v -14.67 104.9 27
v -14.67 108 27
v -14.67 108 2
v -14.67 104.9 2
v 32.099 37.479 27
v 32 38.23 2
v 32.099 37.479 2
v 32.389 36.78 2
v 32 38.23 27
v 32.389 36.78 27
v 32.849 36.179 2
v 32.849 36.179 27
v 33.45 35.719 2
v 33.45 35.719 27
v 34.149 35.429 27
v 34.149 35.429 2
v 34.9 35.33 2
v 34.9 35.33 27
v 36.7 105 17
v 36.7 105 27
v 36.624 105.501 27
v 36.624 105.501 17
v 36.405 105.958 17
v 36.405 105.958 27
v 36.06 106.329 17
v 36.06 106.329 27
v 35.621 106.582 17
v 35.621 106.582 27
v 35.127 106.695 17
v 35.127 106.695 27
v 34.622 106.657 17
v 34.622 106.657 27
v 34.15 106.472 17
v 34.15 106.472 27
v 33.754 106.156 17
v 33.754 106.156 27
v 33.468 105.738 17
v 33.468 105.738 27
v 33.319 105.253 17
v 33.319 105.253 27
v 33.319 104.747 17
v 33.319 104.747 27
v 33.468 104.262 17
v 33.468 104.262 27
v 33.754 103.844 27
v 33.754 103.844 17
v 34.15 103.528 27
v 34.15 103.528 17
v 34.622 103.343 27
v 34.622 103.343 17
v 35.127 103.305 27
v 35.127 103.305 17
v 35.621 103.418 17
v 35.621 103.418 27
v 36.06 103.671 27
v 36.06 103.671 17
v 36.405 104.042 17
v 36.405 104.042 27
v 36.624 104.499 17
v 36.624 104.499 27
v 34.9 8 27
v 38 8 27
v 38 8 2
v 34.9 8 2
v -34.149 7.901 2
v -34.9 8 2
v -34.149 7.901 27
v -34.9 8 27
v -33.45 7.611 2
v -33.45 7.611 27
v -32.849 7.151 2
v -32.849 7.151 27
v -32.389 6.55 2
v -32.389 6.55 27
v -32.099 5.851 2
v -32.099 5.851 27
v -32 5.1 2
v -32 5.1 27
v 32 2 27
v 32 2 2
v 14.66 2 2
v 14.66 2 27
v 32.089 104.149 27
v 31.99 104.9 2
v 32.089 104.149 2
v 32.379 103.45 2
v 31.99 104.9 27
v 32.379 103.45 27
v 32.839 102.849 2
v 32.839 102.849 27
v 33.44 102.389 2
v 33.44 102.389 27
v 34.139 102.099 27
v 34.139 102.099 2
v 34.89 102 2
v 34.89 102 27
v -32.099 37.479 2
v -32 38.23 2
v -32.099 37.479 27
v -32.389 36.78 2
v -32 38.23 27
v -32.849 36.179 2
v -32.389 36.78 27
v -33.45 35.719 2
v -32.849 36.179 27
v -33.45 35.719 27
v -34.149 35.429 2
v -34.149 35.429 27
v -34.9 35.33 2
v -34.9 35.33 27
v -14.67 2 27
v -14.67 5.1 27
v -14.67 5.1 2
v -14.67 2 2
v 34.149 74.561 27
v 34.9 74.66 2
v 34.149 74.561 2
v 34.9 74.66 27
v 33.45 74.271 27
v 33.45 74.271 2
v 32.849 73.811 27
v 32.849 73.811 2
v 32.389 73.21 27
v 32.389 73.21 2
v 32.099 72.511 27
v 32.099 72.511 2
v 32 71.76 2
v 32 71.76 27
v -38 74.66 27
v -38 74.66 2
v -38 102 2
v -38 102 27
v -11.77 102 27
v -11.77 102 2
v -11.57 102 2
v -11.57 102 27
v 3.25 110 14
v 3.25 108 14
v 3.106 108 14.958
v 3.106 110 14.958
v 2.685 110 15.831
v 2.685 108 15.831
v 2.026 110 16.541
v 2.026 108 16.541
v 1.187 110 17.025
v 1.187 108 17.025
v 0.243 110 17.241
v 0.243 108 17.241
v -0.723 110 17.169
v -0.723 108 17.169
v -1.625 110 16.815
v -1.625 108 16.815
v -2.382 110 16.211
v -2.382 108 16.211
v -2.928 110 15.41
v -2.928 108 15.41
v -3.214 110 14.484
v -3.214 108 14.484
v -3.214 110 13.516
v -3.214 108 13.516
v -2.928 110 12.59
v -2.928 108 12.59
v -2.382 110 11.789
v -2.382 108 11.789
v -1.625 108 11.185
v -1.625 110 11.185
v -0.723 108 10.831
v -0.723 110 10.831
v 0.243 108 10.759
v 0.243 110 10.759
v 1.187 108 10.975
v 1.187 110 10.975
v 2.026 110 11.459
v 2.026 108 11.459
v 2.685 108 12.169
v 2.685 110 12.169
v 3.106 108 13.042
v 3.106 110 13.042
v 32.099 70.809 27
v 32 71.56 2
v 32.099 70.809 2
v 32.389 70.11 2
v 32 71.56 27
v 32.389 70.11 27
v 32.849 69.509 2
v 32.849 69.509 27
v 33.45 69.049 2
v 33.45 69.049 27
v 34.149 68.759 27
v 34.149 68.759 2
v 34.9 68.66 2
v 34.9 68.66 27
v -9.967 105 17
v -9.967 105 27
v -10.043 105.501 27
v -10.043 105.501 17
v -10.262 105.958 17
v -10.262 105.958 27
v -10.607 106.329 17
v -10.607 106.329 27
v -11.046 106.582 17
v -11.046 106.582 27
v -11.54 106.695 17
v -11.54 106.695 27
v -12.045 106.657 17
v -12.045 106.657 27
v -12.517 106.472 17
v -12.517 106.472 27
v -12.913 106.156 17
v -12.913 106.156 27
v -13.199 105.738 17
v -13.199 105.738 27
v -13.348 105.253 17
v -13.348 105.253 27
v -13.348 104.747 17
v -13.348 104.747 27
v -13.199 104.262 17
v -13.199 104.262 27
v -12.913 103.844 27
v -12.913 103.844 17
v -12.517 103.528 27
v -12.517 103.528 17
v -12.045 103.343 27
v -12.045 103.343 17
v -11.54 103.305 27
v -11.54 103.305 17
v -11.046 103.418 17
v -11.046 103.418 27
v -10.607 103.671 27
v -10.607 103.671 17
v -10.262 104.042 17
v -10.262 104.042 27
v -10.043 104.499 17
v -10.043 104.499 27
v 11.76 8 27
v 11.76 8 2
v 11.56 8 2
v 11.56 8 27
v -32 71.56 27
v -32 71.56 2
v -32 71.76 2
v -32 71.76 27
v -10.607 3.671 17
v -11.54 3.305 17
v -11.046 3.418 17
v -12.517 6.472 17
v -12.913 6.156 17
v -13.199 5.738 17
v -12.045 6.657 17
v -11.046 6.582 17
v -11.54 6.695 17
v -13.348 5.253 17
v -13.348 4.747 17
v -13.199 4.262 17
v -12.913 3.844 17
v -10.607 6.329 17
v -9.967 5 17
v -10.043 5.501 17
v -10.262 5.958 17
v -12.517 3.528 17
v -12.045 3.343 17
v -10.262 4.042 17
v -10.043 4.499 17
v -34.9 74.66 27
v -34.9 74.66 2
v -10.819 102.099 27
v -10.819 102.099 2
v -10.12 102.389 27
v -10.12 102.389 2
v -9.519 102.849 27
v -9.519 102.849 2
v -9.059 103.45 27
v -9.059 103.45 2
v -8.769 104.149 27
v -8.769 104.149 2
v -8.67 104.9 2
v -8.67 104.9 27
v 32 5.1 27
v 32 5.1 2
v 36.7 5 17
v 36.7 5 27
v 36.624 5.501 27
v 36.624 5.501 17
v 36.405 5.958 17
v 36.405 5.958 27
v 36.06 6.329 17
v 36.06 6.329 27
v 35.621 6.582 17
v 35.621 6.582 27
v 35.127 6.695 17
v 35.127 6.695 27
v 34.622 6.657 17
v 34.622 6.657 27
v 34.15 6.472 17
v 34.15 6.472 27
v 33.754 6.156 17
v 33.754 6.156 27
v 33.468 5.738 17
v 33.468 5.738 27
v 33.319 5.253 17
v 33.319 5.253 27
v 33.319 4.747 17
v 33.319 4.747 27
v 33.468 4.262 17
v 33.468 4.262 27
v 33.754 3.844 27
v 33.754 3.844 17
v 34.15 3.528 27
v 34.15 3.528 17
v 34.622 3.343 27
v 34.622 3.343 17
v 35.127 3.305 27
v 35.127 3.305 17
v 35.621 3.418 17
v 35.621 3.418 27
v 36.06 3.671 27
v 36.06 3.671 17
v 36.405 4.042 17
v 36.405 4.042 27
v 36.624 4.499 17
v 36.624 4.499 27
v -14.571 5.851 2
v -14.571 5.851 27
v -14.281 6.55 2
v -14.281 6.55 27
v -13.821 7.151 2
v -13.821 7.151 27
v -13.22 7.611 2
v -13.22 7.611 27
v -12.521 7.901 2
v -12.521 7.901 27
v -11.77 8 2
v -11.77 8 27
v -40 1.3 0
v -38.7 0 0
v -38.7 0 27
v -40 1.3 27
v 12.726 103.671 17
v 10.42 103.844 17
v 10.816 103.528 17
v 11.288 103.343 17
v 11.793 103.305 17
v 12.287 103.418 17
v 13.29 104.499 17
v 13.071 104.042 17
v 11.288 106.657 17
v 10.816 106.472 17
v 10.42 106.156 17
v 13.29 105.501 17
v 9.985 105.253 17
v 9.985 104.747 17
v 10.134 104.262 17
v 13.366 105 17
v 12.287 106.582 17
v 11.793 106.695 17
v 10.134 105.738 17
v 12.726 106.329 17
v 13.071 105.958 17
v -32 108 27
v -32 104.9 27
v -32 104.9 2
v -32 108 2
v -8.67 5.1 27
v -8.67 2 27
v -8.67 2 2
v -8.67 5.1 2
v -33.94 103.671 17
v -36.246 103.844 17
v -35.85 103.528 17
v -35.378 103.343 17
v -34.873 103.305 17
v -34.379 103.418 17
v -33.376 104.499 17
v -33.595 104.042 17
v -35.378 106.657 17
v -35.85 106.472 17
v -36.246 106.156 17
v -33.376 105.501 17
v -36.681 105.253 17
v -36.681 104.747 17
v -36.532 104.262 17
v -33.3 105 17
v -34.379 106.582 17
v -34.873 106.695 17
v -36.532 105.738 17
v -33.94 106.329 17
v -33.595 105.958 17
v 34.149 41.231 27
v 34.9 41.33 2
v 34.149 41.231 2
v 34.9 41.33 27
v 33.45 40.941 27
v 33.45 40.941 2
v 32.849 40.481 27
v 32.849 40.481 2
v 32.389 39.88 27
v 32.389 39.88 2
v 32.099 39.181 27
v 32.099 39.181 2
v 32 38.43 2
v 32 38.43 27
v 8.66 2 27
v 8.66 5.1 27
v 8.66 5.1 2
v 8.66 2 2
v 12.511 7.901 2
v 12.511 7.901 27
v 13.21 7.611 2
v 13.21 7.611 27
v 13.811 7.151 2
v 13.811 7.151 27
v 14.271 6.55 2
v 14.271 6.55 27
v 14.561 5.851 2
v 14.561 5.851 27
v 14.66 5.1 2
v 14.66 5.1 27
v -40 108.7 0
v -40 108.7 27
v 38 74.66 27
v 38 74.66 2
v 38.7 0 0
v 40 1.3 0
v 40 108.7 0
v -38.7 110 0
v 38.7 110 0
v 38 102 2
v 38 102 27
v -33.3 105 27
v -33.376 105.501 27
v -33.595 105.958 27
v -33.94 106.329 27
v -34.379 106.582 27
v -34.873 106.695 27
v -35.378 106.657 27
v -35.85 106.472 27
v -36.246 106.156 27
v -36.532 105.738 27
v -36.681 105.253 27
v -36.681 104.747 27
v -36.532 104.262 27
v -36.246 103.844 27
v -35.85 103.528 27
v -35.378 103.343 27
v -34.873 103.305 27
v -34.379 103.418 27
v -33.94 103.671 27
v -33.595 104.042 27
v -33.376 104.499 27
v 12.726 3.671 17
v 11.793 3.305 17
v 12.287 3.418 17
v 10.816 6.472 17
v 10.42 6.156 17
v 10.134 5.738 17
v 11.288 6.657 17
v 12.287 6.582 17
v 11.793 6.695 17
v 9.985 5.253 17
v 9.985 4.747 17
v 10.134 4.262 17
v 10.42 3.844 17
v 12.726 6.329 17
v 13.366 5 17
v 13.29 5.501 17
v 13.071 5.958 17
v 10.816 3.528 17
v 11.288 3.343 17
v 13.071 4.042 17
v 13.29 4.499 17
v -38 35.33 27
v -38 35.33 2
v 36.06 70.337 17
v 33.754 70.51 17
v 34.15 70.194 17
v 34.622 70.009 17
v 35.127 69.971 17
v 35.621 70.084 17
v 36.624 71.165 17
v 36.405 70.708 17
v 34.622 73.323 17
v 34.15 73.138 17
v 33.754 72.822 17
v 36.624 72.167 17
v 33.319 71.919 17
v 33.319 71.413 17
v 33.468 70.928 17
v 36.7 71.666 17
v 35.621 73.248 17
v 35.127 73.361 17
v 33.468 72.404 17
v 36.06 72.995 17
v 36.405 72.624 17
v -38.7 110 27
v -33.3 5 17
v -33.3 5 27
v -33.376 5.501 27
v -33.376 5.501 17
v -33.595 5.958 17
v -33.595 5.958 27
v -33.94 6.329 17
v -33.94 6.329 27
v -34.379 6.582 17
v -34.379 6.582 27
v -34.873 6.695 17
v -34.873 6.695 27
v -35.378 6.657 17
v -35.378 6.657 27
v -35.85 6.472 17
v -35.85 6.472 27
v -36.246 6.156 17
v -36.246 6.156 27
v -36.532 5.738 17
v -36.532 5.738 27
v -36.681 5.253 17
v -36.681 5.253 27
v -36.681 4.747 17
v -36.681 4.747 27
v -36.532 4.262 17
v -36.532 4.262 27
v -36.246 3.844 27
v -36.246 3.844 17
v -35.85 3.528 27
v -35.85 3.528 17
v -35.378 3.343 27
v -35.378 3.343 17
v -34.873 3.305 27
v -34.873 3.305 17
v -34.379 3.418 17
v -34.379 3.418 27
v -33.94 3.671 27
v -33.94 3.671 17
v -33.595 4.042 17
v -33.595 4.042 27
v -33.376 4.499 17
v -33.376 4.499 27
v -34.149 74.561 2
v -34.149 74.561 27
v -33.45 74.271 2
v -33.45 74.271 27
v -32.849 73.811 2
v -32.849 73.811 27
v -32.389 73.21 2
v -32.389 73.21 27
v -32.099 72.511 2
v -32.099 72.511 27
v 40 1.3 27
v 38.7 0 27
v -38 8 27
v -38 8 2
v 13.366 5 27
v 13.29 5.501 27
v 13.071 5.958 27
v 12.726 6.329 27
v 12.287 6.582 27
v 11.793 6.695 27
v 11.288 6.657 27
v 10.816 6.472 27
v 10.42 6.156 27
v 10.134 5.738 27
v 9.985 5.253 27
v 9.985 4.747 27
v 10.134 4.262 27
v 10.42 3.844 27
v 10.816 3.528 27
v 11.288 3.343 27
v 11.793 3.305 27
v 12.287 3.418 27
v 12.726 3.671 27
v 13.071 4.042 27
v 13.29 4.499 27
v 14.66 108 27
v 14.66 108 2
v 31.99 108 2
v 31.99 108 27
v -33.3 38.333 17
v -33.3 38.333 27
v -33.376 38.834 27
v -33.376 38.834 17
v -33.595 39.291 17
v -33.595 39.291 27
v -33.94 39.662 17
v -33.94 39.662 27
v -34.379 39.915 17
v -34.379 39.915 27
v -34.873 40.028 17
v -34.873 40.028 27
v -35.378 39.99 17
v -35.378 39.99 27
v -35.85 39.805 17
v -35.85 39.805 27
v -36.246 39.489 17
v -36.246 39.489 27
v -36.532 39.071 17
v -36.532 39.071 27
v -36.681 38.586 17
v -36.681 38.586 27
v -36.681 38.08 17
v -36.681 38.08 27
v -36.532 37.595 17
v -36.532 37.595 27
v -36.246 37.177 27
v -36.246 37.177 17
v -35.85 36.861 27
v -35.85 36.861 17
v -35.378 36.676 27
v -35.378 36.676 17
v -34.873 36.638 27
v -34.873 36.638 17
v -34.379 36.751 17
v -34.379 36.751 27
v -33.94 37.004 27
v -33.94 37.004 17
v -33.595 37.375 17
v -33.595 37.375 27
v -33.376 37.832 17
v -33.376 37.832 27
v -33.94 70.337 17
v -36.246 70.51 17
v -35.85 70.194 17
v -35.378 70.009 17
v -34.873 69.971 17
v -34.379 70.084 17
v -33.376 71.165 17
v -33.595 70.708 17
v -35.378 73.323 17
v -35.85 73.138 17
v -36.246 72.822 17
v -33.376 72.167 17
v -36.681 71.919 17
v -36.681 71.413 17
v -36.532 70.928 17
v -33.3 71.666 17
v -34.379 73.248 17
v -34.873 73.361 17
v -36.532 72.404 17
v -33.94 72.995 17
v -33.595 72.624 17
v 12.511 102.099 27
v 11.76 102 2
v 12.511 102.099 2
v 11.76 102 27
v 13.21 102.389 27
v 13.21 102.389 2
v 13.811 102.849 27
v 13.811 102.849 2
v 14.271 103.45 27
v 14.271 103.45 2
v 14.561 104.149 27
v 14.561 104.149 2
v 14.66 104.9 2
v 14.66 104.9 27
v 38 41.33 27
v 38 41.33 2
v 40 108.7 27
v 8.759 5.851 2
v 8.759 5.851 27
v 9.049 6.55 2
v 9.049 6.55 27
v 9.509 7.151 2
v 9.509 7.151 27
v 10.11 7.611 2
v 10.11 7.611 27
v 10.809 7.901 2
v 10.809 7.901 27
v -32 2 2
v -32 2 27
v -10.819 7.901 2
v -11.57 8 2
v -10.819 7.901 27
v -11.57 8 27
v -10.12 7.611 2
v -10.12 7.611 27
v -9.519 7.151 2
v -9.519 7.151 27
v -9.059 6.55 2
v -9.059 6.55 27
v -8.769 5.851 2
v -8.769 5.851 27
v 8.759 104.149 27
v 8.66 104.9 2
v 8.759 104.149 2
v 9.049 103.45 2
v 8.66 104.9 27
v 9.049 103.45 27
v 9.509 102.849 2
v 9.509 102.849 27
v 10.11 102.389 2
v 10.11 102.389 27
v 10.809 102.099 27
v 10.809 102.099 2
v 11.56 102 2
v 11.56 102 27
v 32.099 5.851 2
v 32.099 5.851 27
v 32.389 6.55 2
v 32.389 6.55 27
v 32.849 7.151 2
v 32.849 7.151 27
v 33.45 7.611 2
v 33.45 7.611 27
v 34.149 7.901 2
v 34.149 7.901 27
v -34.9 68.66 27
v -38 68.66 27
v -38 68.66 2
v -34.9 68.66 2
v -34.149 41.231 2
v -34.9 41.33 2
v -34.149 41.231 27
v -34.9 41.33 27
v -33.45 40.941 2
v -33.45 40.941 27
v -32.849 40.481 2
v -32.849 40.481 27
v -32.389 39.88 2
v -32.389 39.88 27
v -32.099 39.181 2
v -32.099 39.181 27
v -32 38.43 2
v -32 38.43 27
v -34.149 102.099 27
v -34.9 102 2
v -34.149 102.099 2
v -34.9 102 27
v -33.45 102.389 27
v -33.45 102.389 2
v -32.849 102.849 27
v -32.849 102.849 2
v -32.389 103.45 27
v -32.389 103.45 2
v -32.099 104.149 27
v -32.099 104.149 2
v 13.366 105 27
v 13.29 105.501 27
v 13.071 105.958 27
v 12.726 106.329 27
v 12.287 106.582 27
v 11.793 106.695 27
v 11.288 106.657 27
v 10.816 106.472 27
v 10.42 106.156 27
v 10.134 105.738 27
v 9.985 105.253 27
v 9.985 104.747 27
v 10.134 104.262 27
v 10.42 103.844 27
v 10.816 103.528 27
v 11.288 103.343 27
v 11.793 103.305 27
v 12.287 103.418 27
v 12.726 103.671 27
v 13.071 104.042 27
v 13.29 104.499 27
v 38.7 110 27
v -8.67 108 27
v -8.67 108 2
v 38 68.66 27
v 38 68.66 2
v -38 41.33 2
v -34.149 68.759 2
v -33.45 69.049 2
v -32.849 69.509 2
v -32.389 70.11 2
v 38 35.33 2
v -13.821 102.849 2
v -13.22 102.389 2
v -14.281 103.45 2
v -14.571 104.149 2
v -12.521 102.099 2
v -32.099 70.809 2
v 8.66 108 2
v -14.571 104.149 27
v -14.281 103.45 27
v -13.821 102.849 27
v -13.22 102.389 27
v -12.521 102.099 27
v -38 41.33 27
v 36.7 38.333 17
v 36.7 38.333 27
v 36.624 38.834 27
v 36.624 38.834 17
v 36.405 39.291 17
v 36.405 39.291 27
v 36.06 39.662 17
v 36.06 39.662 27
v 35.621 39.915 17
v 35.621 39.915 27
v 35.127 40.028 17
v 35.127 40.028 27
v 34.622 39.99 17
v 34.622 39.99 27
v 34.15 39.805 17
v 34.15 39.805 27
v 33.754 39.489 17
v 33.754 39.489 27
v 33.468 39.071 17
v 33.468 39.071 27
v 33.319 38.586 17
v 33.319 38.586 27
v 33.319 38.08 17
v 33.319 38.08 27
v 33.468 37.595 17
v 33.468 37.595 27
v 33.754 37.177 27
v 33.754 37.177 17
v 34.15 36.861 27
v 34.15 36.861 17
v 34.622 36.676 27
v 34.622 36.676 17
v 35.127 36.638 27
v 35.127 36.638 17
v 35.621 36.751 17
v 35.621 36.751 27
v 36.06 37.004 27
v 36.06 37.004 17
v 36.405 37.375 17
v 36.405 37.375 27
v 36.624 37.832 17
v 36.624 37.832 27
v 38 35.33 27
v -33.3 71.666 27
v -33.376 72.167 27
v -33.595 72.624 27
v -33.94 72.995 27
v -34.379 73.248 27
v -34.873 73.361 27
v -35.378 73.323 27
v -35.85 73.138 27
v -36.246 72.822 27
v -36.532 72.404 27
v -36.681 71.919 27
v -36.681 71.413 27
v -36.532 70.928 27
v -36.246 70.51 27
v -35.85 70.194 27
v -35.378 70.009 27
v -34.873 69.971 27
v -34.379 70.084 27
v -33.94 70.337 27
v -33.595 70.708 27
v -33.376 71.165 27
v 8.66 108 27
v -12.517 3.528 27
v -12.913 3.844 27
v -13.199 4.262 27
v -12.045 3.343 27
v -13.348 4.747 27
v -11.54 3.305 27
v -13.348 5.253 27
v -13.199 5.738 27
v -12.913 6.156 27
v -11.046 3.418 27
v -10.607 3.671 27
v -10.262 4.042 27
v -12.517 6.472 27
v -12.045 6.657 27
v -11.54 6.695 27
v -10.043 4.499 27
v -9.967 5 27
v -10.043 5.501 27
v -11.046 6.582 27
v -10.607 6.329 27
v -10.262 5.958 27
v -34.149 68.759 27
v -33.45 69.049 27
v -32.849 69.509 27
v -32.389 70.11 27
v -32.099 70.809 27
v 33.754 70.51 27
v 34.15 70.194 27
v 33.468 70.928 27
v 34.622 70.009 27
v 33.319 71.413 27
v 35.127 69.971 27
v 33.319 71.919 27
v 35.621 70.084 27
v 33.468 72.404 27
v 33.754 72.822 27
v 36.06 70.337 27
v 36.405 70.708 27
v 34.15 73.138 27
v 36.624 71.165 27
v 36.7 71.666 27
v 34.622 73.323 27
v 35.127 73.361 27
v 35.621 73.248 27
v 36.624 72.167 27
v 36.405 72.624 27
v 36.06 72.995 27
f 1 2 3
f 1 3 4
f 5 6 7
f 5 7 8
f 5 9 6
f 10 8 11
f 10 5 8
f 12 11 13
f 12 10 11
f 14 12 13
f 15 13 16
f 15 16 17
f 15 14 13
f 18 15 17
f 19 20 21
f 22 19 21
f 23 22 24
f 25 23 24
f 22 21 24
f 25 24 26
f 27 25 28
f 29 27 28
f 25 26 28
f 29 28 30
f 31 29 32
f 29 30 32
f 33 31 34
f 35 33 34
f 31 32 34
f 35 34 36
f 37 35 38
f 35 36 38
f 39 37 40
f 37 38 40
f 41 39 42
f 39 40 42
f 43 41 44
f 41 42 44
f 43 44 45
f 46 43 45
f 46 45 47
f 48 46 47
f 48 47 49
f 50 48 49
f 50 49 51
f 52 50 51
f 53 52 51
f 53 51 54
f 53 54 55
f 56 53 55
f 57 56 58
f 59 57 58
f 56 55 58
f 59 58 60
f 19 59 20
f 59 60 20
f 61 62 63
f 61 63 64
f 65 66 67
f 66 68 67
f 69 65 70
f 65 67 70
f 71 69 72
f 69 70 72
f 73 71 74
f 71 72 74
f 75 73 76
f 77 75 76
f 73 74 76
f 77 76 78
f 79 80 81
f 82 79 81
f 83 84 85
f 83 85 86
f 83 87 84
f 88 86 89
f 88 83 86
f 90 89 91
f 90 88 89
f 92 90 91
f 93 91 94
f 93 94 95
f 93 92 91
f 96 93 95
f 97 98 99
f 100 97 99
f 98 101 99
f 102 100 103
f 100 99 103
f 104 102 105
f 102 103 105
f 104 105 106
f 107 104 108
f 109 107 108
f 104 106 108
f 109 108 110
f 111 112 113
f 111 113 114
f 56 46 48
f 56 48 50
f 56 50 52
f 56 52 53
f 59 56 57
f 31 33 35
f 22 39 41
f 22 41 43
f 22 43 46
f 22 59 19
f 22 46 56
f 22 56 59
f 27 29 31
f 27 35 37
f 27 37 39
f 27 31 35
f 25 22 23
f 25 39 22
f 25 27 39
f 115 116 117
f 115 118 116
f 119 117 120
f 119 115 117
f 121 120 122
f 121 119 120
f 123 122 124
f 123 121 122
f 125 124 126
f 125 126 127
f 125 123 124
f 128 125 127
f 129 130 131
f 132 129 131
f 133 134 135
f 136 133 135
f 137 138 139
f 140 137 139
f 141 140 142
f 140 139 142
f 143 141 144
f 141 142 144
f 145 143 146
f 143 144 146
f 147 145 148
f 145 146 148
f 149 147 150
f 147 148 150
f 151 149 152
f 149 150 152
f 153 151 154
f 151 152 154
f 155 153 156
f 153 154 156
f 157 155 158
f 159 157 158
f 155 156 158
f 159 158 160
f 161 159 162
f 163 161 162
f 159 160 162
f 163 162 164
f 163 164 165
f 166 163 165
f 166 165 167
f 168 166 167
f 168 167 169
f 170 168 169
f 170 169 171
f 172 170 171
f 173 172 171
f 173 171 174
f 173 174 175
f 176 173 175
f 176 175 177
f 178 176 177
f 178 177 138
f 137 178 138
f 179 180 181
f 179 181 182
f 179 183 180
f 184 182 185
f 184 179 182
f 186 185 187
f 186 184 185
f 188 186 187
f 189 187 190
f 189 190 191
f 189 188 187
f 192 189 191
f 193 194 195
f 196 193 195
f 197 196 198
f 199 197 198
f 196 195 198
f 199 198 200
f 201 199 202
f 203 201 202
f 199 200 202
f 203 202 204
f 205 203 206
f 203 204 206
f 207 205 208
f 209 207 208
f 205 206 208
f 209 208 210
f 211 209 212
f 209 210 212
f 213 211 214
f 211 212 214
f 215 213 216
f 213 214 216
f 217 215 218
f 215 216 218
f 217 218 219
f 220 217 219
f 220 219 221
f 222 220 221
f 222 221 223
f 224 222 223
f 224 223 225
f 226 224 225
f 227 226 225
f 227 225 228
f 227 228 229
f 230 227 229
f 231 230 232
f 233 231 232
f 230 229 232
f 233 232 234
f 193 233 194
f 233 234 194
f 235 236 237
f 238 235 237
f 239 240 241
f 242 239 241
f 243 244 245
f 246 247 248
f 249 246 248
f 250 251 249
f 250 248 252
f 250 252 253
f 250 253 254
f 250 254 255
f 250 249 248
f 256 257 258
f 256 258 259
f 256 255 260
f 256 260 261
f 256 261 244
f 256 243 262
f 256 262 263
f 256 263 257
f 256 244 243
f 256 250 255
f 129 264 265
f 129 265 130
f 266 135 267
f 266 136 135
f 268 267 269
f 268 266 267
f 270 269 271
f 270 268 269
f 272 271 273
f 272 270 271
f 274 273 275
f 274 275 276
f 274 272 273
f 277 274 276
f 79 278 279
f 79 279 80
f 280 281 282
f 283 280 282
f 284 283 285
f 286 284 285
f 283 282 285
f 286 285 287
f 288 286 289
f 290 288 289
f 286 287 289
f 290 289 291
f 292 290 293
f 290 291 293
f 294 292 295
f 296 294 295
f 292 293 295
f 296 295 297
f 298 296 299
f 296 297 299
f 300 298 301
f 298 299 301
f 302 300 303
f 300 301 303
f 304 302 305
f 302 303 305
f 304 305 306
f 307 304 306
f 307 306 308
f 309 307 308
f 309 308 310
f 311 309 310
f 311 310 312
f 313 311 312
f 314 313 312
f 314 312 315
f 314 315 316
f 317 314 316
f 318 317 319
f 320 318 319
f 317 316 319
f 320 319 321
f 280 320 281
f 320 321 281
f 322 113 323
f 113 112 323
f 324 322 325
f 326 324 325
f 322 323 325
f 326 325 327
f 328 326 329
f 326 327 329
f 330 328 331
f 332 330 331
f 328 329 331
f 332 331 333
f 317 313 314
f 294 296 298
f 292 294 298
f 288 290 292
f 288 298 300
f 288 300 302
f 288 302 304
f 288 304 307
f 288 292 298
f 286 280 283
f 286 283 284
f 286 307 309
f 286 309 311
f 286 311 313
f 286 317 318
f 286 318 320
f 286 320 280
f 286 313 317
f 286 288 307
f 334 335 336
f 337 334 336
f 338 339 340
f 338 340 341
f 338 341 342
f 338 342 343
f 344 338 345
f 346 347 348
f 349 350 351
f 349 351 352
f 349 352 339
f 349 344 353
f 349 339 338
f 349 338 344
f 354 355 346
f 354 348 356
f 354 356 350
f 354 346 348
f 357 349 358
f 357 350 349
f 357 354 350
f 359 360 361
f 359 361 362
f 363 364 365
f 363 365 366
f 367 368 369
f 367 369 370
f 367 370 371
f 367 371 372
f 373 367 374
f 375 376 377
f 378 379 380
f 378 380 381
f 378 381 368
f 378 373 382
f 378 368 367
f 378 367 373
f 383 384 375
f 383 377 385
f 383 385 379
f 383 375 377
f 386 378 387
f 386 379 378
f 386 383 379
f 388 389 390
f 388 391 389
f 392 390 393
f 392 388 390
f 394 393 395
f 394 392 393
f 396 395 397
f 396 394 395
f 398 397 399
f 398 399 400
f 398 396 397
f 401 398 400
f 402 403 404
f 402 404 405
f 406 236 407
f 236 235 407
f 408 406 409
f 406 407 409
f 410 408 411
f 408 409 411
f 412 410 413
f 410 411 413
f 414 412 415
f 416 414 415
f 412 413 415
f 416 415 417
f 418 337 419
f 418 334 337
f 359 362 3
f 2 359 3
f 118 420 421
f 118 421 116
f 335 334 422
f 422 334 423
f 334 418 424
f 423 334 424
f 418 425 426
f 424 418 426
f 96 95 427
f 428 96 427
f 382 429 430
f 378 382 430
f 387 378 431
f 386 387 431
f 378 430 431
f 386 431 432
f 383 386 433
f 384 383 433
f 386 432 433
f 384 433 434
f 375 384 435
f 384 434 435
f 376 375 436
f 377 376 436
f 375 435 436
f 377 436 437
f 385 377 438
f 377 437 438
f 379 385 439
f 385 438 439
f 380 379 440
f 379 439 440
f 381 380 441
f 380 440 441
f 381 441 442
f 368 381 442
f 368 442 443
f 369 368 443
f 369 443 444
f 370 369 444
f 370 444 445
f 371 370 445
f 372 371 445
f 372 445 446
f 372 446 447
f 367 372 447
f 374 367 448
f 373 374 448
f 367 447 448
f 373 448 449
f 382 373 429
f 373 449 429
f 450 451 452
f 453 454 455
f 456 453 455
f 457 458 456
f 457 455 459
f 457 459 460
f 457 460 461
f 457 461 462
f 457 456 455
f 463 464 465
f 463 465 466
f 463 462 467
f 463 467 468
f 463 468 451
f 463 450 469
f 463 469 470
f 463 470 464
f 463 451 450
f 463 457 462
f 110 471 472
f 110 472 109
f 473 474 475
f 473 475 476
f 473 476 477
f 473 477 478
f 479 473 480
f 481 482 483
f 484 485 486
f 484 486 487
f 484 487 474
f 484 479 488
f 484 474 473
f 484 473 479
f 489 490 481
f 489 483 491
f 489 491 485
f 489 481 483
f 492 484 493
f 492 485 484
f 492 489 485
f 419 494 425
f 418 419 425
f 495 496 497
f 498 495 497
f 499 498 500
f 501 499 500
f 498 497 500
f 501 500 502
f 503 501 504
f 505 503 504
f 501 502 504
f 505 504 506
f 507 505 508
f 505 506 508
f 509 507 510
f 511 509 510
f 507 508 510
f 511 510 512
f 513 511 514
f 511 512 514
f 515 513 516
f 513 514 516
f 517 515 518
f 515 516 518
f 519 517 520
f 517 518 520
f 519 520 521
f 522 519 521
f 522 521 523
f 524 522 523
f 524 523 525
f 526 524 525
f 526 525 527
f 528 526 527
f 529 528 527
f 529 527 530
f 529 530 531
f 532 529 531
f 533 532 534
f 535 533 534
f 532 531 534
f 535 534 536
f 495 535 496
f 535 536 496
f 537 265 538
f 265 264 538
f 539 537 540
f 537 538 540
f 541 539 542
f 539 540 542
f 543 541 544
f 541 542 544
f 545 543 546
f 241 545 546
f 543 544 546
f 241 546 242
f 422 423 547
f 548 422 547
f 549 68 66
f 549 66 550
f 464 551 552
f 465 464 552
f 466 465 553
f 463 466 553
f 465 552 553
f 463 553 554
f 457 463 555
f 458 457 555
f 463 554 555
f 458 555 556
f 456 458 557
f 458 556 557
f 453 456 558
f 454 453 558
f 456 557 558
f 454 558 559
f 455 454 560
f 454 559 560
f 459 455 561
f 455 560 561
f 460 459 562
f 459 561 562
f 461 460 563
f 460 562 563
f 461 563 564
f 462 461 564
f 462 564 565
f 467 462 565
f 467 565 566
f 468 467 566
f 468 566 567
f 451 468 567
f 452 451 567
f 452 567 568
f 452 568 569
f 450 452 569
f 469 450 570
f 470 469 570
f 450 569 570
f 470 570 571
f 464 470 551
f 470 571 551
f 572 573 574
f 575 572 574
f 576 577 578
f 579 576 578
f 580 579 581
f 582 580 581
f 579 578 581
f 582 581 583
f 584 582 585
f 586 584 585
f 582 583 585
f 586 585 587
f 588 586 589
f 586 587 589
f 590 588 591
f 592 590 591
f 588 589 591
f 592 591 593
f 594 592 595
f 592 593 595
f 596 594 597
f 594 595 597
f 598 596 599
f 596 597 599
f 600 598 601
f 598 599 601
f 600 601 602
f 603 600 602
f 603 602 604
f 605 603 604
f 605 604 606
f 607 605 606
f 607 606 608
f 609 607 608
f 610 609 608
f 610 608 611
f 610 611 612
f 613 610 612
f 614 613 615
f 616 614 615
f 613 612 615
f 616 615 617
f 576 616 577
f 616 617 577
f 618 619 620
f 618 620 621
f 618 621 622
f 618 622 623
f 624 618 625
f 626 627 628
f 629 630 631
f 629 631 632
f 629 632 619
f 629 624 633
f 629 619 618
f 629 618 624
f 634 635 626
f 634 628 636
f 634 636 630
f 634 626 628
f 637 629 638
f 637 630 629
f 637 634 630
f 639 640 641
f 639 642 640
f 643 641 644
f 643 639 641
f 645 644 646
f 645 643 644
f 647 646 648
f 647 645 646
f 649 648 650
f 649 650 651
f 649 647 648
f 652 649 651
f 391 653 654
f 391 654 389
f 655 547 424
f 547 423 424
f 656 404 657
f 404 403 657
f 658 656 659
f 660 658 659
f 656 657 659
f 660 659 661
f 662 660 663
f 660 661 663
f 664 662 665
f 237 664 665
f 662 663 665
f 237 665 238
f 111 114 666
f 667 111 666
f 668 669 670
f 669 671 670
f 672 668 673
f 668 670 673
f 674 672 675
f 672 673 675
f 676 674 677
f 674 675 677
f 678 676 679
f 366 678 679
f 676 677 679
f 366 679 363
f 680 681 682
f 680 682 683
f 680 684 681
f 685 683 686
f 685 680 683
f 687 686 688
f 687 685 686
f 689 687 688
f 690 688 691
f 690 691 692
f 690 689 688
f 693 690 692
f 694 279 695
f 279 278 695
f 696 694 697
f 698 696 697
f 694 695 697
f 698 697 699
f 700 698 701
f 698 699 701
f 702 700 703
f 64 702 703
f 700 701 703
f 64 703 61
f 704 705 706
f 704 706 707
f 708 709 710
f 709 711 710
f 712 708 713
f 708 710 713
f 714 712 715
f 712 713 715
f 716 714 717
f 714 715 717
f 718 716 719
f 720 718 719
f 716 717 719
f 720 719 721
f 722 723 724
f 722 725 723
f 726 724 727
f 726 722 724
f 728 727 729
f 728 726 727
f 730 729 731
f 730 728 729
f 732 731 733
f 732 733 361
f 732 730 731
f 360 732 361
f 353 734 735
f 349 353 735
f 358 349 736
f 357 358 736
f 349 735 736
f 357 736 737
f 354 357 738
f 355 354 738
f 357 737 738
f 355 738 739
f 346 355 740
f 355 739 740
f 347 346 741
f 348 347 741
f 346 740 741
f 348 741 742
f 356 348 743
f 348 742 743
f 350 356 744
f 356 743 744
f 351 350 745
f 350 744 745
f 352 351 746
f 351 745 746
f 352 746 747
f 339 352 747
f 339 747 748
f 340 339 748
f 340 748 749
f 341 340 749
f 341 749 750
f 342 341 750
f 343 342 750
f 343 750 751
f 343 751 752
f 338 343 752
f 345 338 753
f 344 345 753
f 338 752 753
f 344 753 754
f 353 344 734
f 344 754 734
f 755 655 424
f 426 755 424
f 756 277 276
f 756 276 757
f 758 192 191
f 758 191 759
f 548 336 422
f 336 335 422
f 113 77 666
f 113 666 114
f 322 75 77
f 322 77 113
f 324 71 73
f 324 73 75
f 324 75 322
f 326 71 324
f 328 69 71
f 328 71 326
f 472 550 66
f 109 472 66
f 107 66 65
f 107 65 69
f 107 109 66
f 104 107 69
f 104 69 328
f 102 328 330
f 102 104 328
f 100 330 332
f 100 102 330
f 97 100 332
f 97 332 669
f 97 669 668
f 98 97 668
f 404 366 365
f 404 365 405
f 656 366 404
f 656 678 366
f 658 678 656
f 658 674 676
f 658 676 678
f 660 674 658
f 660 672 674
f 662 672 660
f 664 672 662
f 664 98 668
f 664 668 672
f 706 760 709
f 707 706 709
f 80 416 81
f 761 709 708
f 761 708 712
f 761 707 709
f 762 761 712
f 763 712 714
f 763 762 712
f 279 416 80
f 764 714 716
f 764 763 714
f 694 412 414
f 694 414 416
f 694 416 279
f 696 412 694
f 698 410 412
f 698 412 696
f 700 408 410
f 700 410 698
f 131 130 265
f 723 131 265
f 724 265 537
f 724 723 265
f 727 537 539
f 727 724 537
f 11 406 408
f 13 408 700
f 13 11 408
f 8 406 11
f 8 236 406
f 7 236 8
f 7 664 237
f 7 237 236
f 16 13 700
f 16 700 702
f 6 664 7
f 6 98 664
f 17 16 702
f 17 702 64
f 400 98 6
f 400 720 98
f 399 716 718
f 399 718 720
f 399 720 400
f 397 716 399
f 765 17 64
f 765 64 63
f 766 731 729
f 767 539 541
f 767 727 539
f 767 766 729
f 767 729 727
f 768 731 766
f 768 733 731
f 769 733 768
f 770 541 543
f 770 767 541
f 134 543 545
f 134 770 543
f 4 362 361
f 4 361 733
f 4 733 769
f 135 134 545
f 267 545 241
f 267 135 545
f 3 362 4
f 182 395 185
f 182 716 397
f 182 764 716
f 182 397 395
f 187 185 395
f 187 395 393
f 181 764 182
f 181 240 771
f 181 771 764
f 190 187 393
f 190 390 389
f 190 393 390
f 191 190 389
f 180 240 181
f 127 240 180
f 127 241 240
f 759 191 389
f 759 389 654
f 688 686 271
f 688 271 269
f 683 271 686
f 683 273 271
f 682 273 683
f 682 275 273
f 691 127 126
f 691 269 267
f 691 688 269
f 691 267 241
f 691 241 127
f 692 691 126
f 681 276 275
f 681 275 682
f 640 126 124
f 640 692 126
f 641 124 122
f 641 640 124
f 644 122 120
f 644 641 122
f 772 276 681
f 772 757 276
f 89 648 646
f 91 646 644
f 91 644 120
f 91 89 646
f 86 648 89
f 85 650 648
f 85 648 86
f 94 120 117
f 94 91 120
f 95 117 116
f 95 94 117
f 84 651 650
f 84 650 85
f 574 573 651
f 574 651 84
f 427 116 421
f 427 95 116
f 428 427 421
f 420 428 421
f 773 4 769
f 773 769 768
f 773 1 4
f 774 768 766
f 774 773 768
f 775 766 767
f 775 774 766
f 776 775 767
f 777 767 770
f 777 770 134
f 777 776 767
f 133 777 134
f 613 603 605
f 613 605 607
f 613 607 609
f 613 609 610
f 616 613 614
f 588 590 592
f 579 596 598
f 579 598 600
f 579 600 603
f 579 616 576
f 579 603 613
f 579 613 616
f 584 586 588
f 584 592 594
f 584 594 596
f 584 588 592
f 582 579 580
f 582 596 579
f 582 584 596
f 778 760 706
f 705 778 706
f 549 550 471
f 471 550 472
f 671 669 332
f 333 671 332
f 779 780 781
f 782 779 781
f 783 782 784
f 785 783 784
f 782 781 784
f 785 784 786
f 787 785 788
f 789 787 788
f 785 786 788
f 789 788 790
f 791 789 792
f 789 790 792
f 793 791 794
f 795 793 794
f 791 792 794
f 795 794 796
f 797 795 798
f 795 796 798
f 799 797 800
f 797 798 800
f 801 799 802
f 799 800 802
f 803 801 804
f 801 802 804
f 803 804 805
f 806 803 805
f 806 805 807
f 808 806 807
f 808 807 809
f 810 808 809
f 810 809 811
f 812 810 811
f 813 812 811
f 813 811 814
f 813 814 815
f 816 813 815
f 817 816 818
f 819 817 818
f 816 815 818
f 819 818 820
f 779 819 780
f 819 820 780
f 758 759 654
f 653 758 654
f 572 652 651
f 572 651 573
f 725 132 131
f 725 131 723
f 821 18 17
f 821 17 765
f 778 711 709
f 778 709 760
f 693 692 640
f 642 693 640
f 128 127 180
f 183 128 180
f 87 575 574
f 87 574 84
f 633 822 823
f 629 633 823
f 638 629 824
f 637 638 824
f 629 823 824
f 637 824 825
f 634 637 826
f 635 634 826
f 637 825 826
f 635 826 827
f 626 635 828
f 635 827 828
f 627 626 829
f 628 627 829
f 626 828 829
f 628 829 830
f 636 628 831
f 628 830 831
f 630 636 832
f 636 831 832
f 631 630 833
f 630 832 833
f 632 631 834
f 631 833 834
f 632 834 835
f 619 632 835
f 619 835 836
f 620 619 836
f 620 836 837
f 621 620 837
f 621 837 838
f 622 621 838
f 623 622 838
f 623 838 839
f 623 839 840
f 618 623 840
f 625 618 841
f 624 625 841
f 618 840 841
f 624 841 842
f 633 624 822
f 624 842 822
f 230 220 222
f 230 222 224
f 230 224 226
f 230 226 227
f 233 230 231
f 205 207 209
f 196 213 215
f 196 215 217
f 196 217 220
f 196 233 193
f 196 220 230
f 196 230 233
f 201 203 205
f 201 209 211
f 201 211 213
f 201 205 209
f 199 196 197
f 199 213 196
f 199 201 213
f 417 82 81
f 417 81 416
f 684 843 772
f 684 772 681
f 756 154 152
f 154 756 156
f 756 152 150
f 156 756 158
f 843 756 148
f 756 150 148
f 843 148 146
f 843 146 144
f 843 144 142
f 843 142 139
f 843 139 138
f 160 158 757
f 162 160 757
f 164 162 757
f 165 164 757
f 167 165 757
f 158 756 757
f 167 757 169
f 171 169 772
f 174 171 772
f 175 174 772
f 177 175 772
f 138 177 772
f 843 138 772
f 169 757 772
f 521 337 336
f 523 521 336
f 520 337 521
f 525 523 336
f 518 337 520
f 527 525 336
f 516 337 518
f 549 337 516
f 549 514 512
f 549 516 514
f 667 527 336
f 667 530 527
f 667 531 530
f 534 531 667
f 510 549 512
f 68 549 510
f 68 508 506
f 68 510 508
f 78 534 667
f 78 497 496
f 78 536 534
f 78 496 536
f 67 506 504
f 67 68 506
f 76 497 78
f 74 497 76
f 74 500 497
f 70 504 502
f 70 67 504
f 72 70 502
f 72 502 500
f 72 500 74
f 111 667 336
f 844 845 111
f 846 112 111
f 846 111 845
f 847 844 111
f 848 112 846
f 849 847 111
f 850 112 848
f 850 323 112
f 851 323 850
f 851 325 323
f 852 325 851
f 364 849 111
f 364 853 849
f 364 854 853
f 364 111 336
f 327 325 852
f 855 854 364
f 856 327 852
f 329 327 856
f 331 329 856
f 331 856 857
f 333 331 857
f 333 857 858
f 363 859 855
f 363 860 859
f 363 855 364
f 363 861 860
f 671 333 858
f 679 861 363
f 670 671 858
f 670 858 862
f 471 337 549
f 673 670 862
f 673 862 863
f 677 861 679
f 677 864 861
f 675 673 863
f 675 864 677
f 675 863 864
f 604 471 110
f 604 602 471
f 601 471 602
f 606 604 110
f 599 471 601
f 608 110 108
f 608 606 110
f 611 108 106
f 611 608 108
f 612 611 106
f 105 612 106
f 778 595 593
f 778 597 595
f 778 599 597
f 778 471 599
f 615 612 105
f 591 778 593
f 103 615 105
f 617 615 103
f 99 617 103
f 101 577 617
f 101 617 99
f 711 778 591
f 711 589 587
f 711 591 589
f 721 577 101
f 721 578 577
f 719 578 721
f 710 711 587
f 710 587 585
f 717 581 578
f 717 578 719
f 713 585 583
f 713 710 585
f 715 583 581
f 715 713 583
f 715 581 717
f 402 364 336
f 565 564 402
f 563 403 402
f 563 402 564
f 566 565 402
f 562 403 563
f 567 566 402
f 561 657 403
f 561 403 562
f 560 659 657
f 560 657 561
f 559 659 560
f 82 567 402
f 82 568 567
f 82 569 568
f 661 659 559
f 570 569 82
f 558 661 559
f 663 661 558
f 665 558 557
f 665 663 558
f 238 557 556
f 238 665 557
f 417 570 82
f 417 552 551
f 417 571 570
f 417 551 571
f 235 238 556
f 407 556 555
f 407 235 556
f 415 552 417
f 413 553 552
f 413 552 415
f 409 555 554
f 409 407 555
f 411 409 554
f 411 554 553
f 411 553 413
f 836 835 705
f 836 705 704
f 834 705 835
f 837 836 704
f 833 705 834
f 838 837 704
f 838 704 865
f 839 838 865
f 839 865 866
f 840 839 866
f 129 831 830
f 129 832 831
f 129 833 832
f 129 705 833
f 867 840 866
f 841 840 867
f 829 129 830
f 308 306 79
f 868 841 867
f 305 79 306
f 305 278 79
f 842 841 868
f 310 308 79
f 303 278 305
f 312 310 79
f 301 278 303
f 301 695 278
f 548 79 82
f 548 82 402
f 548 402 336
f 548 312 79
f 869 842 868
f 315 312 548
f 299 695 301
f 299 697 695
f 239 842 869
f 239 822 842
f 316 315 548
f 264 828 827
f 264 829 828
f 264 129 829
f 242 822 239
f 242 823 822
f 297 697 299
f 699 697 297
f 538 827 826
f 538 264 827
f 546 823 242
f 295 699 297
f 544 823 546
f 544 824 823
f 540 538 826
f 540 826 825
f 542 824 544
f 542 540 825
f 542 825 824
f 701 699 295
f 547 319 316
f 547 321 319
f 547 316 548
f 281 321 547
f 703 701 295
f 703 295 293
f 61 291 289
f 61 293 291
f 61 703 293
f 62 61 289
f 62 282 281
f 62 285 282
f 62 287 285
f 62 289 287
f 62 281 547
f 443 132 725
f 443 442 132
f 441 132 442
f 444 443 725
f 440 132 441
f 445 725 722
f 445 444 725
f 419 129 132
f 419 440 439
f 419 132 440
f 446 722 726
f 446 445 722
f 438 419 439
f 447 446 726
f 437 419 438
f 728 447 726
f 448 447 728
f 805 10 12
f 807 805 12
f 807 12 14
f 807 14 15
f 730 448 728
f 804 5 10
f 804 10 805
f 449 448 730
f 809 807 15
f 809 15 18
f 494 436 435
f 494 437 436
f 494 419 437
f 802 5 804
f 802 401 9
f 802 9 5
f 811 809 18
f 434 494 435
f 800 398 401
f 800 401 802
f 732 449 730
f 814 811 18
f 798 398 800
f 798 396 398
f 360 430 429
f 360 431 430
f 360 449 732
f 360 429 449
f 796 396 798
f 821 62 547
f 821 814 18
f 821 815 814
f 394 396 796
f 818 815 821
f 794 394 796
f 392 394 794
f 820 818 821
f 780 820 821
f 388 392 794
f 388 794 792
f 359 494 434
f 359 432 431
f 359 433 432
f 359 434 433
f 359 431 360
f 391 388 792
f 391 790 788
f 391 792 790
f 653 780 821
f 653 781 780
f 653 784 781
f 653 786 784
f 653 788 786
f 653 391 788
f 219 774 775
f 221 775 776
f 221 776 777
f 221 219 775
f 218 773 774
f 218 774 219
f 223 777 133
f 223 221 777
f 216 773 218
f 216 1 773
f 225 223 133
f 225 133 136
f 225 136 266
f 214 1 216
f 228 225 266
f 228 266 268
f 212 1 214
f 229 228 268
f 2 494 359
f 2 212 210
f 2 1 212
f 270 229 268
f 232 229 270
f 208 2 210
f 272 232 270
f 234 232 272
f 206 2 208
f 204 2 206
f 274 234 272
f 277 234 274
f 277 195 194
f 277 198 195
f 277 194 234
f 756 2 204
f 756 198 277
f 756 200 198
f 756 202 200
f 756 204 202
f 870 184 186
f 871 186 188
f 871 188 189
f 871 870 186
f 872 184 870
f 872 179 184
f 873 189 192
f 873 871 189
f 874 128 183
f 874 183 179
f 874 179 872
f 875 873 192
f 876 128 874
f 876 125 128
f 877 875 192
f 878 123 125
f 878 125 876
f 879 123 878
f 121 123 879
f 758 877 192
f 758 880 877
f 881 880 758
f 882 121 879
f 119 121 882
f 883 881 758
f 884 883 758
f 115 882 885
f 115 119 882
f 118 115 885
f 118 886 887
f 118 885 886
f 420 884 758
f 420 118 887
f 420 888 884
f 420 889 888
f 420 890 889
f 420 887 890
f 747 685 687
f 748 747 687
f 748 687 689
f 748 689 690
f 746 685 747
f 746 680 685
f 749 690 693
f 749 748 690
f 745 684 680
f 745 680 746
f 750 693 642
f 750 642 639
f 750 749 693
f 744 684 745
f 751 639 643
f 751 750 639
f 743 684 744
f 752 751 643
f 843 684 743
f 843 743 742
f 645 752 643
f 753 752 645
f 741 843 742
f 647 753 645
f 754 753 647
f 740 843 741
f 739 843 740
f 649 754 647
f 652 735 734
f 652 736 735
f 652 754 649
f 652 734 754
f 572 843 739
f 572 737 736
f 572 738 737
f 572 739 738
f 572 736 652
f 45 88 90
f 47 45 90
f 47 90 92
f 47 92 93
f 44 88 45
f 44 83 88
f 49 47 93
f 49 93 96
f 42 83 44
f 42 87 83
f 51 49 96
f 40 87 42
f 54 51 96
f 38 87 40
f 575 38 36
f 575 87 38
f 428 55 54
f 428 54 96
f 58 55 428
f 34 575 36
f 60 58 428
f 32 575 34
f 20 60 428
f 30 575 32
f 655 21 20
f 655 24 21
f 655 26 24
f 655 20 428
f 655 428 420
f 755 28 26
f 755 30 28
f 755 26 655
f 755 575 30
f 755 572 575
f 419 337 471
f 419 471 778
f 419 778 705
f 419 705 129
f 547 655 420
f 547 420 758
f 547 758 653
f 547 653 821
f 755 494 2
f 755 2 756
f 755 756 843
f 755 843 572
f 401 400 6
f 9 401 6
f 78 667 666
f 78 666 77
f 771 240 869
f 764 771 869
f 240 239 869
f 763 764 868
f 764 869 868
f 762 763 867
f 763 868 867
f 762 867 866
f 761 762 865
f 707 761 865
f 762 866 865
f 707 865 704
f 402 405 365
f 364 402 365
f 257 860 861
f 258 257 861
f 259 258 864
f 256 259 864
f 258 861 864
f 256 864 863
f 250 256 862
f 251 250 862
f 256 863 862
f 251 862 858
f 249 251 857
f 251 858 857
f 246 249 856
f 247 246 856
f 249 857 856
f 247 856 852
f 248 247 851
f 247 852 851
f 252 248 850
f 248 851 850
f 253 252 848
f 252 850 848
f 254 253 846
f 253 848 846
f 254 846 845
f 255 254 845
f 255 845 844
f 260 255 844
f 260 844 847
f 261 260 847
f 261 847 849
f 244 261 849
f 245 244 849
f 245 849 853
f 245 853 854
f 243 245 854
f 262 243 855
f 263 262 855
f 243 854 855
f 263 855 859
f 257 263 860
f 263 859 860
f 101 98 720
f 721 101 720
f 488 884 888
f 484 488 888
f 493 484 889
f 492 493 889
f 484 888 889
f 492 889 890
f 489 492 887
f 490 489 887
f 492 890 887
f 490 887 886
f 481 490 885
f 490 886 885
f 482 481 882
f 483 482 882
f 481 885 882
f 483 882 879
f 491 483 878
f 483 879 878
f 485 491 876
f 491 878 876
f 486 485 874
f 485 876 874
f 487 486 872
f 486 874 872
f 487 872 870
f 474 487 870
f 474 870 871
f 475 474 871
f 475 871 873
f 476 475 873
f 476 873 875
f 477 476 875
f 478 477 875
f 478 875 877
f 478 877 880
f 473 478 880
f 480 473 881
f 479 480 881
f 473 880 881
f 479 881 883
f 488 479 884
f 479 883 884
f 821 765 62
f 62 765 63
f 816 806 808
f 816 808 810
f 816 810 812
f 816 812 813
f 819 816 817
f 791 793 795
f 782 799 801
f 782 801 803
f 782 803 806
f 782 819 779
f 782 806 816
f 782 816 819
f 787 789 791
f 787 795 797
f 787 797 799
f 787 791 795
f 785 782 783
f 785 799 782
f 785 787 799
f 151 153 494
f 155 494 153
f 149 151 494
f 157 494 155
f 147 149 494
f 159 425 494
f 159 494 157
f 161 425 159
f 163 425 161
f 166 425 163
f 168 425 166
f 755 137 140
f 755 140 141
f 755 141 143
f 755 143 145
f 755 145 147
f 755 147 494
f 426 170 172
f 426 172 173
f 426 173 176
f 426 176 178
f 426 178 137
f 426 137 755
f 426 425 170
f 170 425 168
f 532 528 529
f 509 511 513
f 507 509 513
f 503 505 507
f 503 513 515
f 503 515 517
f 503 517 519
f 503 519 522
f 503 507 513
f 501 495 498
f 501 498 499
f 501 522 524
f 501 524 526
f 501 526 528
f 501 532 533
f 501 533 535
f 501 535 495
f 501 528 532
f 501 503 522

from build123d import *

# Parameters (mm, degrees)
SKETCH024_W     = 80
SKETCH024_H     = 110
PAD008_DEPTH    = 2
SKETCH030_W     = 80
SKETCH030_H     = 110
PAD009_DEPTH    = 25
SKETCH029_R     = 1.7
POCKET016_DEPTH = 10
SKETCH031_R     = 3.25
POCKET017_DEPTH = 2.001
FILLET006_R     = 2.9
CHAMFER005_SIZE = 1.3


with BuildPart() as part:
    # Sketch024 → Pad008 (new body)
    with BuildSketch(Plane.XY):
        with Locations((0, 55)):
            Rectangle(SKETCH024_W, SKETCH024_H)
    extrude(amount=PAD008_DEPTH)

    # Sketch030 (on Face6 of Pad008) → Pad009 (join)
    with BuildSketch(Plane.XY.offset(2)):
        with Locations((0, 55)):
            Rectangle(SKETCH030_W, SKETCH030_H)
        Polygon((-38, 102), (-32, 102), (-32, 108), (-14.67, 108), (-14.67, 102), (-8.67, 102), (-8.67, 108), (8.66, 108), (8.66, 102), (14.66, 102), (14.66, 108), (31.99, 108), (31.99, 102), (38, 102), (38, 74.66), (32, 74.66), (32, 68.66), (38, 68.66), (38, 41.33), (32, 41.33), (32, 35.33), (38, 35.33), (38, 8), (32, 8), (32, 2), (14.66, 2), (14.66, 8), (8.66, 8), (8.66, 2), (-8.67, 2), (-8.67, 8), (-14.67, 8), (-14.67, 2), (-32, 2), (-32, 8), (-38, 8), (-38, 35.33), (-32, 35.33), (-32, 41.33), (-38, 41.33), (-38, 68.66), (-32, 68.66), (-32, 74.66), (-38, 74.66), align=None, mode=Mode.SUBTRACT)
    extrude(amount=PAD009_DEPTH)

    # Sketch029 (on Face3 of Pad009) → Pocket016 (cut)
    with BuildSketch(Plane.XY.offset(27)):
        with Locations((-11.667, 5)):
            Circle(SKETCH029_R)
        with Locations((11.666, 5)):
            Circle(SKETCH029_R)
        with Locations((35, 5)):
            Circle(SKETCH029_R)
        with Locations((-35, 38.333)):
            Circle(SKETCH029_R)
        with Locations((-35, 71.666)):
            Circle(SKETCH029_R)
        with Locations((-35, 105)):
            Circle(SKETCH029_R)
        with Locations((35, 38.333)):
            Circle(SKETCH029_R)
        with Locations((35, 71.666)):
            Circle(SKETCH029_R)
        with Locations((35, 105)):
            Circle(SKETCH029_R)
        with Locations((-11.667, 105)):
            Circle(SKETCH029_R)
        with Locations((11.666, 105)):
            Circle(SKETCH029_R)
        with Locations((-35, 5)):
            Circle(SKETCH029_R)
    extrude(amount=-POCKET016_DEPTH, mode=Mode.SUBTRACT)

    # Sketch031 (on Face28 of Pocket016) → Pocket017 (cut, through all)
    with BuildSketch(Plane.XZ.offset(-108)):
        with Locations((0, 14)):
            Circle(SKETCH031_R)
    extrude(amount=-POCKET017_DEPTH, mode=Mode.SUBTRACT)

    # Fillet006
    fillet006_edges = [part.edges().sort_by_distance(p)[0] for p in [
        (-32, 8, 14.5),
        (-14.67, 8, 14.5),
        (-8.67, 8, 14.5),
        (8.66, 8, 14.5),
        (14.66, 8, 14.5),
        (32, 8, 14.5),
        (-32, 35.33, 14.5),
        (-32, 41.33, 14.5),
        (-32, 68.66, 14.5),
        (-32, 74.66, 14.5),
        (32, 35.33, 14.5),
        (32, 41.33, 14.5),
        (32, 68.66, 14.5),
        (32, 74.66, 14.5),
        (31.99, 102, 14.5),
        (14.66, 102, 14.5),
        (8.66, 102, 14.5),
        (-8.67, 102, 14.5),
        (-14.67, 102, 14.5),
        (-32, 102, 14.5),
    ]]
    fillet(fillet006_edges, radius=FILLET006_R)

    # Chamfer005
    chamfer005_edges = [part.edges().sort_by_distance(p)[0] for p in [
        (40, 110, 13.5),
        (-40, 110, 13.5),
        (40, 0, 13.5),
        (-40, 0, 13.5),
    ]]
    chamfer(chamfer005_edges, length=CHAMFER005_SIZE)


solid = part.part
